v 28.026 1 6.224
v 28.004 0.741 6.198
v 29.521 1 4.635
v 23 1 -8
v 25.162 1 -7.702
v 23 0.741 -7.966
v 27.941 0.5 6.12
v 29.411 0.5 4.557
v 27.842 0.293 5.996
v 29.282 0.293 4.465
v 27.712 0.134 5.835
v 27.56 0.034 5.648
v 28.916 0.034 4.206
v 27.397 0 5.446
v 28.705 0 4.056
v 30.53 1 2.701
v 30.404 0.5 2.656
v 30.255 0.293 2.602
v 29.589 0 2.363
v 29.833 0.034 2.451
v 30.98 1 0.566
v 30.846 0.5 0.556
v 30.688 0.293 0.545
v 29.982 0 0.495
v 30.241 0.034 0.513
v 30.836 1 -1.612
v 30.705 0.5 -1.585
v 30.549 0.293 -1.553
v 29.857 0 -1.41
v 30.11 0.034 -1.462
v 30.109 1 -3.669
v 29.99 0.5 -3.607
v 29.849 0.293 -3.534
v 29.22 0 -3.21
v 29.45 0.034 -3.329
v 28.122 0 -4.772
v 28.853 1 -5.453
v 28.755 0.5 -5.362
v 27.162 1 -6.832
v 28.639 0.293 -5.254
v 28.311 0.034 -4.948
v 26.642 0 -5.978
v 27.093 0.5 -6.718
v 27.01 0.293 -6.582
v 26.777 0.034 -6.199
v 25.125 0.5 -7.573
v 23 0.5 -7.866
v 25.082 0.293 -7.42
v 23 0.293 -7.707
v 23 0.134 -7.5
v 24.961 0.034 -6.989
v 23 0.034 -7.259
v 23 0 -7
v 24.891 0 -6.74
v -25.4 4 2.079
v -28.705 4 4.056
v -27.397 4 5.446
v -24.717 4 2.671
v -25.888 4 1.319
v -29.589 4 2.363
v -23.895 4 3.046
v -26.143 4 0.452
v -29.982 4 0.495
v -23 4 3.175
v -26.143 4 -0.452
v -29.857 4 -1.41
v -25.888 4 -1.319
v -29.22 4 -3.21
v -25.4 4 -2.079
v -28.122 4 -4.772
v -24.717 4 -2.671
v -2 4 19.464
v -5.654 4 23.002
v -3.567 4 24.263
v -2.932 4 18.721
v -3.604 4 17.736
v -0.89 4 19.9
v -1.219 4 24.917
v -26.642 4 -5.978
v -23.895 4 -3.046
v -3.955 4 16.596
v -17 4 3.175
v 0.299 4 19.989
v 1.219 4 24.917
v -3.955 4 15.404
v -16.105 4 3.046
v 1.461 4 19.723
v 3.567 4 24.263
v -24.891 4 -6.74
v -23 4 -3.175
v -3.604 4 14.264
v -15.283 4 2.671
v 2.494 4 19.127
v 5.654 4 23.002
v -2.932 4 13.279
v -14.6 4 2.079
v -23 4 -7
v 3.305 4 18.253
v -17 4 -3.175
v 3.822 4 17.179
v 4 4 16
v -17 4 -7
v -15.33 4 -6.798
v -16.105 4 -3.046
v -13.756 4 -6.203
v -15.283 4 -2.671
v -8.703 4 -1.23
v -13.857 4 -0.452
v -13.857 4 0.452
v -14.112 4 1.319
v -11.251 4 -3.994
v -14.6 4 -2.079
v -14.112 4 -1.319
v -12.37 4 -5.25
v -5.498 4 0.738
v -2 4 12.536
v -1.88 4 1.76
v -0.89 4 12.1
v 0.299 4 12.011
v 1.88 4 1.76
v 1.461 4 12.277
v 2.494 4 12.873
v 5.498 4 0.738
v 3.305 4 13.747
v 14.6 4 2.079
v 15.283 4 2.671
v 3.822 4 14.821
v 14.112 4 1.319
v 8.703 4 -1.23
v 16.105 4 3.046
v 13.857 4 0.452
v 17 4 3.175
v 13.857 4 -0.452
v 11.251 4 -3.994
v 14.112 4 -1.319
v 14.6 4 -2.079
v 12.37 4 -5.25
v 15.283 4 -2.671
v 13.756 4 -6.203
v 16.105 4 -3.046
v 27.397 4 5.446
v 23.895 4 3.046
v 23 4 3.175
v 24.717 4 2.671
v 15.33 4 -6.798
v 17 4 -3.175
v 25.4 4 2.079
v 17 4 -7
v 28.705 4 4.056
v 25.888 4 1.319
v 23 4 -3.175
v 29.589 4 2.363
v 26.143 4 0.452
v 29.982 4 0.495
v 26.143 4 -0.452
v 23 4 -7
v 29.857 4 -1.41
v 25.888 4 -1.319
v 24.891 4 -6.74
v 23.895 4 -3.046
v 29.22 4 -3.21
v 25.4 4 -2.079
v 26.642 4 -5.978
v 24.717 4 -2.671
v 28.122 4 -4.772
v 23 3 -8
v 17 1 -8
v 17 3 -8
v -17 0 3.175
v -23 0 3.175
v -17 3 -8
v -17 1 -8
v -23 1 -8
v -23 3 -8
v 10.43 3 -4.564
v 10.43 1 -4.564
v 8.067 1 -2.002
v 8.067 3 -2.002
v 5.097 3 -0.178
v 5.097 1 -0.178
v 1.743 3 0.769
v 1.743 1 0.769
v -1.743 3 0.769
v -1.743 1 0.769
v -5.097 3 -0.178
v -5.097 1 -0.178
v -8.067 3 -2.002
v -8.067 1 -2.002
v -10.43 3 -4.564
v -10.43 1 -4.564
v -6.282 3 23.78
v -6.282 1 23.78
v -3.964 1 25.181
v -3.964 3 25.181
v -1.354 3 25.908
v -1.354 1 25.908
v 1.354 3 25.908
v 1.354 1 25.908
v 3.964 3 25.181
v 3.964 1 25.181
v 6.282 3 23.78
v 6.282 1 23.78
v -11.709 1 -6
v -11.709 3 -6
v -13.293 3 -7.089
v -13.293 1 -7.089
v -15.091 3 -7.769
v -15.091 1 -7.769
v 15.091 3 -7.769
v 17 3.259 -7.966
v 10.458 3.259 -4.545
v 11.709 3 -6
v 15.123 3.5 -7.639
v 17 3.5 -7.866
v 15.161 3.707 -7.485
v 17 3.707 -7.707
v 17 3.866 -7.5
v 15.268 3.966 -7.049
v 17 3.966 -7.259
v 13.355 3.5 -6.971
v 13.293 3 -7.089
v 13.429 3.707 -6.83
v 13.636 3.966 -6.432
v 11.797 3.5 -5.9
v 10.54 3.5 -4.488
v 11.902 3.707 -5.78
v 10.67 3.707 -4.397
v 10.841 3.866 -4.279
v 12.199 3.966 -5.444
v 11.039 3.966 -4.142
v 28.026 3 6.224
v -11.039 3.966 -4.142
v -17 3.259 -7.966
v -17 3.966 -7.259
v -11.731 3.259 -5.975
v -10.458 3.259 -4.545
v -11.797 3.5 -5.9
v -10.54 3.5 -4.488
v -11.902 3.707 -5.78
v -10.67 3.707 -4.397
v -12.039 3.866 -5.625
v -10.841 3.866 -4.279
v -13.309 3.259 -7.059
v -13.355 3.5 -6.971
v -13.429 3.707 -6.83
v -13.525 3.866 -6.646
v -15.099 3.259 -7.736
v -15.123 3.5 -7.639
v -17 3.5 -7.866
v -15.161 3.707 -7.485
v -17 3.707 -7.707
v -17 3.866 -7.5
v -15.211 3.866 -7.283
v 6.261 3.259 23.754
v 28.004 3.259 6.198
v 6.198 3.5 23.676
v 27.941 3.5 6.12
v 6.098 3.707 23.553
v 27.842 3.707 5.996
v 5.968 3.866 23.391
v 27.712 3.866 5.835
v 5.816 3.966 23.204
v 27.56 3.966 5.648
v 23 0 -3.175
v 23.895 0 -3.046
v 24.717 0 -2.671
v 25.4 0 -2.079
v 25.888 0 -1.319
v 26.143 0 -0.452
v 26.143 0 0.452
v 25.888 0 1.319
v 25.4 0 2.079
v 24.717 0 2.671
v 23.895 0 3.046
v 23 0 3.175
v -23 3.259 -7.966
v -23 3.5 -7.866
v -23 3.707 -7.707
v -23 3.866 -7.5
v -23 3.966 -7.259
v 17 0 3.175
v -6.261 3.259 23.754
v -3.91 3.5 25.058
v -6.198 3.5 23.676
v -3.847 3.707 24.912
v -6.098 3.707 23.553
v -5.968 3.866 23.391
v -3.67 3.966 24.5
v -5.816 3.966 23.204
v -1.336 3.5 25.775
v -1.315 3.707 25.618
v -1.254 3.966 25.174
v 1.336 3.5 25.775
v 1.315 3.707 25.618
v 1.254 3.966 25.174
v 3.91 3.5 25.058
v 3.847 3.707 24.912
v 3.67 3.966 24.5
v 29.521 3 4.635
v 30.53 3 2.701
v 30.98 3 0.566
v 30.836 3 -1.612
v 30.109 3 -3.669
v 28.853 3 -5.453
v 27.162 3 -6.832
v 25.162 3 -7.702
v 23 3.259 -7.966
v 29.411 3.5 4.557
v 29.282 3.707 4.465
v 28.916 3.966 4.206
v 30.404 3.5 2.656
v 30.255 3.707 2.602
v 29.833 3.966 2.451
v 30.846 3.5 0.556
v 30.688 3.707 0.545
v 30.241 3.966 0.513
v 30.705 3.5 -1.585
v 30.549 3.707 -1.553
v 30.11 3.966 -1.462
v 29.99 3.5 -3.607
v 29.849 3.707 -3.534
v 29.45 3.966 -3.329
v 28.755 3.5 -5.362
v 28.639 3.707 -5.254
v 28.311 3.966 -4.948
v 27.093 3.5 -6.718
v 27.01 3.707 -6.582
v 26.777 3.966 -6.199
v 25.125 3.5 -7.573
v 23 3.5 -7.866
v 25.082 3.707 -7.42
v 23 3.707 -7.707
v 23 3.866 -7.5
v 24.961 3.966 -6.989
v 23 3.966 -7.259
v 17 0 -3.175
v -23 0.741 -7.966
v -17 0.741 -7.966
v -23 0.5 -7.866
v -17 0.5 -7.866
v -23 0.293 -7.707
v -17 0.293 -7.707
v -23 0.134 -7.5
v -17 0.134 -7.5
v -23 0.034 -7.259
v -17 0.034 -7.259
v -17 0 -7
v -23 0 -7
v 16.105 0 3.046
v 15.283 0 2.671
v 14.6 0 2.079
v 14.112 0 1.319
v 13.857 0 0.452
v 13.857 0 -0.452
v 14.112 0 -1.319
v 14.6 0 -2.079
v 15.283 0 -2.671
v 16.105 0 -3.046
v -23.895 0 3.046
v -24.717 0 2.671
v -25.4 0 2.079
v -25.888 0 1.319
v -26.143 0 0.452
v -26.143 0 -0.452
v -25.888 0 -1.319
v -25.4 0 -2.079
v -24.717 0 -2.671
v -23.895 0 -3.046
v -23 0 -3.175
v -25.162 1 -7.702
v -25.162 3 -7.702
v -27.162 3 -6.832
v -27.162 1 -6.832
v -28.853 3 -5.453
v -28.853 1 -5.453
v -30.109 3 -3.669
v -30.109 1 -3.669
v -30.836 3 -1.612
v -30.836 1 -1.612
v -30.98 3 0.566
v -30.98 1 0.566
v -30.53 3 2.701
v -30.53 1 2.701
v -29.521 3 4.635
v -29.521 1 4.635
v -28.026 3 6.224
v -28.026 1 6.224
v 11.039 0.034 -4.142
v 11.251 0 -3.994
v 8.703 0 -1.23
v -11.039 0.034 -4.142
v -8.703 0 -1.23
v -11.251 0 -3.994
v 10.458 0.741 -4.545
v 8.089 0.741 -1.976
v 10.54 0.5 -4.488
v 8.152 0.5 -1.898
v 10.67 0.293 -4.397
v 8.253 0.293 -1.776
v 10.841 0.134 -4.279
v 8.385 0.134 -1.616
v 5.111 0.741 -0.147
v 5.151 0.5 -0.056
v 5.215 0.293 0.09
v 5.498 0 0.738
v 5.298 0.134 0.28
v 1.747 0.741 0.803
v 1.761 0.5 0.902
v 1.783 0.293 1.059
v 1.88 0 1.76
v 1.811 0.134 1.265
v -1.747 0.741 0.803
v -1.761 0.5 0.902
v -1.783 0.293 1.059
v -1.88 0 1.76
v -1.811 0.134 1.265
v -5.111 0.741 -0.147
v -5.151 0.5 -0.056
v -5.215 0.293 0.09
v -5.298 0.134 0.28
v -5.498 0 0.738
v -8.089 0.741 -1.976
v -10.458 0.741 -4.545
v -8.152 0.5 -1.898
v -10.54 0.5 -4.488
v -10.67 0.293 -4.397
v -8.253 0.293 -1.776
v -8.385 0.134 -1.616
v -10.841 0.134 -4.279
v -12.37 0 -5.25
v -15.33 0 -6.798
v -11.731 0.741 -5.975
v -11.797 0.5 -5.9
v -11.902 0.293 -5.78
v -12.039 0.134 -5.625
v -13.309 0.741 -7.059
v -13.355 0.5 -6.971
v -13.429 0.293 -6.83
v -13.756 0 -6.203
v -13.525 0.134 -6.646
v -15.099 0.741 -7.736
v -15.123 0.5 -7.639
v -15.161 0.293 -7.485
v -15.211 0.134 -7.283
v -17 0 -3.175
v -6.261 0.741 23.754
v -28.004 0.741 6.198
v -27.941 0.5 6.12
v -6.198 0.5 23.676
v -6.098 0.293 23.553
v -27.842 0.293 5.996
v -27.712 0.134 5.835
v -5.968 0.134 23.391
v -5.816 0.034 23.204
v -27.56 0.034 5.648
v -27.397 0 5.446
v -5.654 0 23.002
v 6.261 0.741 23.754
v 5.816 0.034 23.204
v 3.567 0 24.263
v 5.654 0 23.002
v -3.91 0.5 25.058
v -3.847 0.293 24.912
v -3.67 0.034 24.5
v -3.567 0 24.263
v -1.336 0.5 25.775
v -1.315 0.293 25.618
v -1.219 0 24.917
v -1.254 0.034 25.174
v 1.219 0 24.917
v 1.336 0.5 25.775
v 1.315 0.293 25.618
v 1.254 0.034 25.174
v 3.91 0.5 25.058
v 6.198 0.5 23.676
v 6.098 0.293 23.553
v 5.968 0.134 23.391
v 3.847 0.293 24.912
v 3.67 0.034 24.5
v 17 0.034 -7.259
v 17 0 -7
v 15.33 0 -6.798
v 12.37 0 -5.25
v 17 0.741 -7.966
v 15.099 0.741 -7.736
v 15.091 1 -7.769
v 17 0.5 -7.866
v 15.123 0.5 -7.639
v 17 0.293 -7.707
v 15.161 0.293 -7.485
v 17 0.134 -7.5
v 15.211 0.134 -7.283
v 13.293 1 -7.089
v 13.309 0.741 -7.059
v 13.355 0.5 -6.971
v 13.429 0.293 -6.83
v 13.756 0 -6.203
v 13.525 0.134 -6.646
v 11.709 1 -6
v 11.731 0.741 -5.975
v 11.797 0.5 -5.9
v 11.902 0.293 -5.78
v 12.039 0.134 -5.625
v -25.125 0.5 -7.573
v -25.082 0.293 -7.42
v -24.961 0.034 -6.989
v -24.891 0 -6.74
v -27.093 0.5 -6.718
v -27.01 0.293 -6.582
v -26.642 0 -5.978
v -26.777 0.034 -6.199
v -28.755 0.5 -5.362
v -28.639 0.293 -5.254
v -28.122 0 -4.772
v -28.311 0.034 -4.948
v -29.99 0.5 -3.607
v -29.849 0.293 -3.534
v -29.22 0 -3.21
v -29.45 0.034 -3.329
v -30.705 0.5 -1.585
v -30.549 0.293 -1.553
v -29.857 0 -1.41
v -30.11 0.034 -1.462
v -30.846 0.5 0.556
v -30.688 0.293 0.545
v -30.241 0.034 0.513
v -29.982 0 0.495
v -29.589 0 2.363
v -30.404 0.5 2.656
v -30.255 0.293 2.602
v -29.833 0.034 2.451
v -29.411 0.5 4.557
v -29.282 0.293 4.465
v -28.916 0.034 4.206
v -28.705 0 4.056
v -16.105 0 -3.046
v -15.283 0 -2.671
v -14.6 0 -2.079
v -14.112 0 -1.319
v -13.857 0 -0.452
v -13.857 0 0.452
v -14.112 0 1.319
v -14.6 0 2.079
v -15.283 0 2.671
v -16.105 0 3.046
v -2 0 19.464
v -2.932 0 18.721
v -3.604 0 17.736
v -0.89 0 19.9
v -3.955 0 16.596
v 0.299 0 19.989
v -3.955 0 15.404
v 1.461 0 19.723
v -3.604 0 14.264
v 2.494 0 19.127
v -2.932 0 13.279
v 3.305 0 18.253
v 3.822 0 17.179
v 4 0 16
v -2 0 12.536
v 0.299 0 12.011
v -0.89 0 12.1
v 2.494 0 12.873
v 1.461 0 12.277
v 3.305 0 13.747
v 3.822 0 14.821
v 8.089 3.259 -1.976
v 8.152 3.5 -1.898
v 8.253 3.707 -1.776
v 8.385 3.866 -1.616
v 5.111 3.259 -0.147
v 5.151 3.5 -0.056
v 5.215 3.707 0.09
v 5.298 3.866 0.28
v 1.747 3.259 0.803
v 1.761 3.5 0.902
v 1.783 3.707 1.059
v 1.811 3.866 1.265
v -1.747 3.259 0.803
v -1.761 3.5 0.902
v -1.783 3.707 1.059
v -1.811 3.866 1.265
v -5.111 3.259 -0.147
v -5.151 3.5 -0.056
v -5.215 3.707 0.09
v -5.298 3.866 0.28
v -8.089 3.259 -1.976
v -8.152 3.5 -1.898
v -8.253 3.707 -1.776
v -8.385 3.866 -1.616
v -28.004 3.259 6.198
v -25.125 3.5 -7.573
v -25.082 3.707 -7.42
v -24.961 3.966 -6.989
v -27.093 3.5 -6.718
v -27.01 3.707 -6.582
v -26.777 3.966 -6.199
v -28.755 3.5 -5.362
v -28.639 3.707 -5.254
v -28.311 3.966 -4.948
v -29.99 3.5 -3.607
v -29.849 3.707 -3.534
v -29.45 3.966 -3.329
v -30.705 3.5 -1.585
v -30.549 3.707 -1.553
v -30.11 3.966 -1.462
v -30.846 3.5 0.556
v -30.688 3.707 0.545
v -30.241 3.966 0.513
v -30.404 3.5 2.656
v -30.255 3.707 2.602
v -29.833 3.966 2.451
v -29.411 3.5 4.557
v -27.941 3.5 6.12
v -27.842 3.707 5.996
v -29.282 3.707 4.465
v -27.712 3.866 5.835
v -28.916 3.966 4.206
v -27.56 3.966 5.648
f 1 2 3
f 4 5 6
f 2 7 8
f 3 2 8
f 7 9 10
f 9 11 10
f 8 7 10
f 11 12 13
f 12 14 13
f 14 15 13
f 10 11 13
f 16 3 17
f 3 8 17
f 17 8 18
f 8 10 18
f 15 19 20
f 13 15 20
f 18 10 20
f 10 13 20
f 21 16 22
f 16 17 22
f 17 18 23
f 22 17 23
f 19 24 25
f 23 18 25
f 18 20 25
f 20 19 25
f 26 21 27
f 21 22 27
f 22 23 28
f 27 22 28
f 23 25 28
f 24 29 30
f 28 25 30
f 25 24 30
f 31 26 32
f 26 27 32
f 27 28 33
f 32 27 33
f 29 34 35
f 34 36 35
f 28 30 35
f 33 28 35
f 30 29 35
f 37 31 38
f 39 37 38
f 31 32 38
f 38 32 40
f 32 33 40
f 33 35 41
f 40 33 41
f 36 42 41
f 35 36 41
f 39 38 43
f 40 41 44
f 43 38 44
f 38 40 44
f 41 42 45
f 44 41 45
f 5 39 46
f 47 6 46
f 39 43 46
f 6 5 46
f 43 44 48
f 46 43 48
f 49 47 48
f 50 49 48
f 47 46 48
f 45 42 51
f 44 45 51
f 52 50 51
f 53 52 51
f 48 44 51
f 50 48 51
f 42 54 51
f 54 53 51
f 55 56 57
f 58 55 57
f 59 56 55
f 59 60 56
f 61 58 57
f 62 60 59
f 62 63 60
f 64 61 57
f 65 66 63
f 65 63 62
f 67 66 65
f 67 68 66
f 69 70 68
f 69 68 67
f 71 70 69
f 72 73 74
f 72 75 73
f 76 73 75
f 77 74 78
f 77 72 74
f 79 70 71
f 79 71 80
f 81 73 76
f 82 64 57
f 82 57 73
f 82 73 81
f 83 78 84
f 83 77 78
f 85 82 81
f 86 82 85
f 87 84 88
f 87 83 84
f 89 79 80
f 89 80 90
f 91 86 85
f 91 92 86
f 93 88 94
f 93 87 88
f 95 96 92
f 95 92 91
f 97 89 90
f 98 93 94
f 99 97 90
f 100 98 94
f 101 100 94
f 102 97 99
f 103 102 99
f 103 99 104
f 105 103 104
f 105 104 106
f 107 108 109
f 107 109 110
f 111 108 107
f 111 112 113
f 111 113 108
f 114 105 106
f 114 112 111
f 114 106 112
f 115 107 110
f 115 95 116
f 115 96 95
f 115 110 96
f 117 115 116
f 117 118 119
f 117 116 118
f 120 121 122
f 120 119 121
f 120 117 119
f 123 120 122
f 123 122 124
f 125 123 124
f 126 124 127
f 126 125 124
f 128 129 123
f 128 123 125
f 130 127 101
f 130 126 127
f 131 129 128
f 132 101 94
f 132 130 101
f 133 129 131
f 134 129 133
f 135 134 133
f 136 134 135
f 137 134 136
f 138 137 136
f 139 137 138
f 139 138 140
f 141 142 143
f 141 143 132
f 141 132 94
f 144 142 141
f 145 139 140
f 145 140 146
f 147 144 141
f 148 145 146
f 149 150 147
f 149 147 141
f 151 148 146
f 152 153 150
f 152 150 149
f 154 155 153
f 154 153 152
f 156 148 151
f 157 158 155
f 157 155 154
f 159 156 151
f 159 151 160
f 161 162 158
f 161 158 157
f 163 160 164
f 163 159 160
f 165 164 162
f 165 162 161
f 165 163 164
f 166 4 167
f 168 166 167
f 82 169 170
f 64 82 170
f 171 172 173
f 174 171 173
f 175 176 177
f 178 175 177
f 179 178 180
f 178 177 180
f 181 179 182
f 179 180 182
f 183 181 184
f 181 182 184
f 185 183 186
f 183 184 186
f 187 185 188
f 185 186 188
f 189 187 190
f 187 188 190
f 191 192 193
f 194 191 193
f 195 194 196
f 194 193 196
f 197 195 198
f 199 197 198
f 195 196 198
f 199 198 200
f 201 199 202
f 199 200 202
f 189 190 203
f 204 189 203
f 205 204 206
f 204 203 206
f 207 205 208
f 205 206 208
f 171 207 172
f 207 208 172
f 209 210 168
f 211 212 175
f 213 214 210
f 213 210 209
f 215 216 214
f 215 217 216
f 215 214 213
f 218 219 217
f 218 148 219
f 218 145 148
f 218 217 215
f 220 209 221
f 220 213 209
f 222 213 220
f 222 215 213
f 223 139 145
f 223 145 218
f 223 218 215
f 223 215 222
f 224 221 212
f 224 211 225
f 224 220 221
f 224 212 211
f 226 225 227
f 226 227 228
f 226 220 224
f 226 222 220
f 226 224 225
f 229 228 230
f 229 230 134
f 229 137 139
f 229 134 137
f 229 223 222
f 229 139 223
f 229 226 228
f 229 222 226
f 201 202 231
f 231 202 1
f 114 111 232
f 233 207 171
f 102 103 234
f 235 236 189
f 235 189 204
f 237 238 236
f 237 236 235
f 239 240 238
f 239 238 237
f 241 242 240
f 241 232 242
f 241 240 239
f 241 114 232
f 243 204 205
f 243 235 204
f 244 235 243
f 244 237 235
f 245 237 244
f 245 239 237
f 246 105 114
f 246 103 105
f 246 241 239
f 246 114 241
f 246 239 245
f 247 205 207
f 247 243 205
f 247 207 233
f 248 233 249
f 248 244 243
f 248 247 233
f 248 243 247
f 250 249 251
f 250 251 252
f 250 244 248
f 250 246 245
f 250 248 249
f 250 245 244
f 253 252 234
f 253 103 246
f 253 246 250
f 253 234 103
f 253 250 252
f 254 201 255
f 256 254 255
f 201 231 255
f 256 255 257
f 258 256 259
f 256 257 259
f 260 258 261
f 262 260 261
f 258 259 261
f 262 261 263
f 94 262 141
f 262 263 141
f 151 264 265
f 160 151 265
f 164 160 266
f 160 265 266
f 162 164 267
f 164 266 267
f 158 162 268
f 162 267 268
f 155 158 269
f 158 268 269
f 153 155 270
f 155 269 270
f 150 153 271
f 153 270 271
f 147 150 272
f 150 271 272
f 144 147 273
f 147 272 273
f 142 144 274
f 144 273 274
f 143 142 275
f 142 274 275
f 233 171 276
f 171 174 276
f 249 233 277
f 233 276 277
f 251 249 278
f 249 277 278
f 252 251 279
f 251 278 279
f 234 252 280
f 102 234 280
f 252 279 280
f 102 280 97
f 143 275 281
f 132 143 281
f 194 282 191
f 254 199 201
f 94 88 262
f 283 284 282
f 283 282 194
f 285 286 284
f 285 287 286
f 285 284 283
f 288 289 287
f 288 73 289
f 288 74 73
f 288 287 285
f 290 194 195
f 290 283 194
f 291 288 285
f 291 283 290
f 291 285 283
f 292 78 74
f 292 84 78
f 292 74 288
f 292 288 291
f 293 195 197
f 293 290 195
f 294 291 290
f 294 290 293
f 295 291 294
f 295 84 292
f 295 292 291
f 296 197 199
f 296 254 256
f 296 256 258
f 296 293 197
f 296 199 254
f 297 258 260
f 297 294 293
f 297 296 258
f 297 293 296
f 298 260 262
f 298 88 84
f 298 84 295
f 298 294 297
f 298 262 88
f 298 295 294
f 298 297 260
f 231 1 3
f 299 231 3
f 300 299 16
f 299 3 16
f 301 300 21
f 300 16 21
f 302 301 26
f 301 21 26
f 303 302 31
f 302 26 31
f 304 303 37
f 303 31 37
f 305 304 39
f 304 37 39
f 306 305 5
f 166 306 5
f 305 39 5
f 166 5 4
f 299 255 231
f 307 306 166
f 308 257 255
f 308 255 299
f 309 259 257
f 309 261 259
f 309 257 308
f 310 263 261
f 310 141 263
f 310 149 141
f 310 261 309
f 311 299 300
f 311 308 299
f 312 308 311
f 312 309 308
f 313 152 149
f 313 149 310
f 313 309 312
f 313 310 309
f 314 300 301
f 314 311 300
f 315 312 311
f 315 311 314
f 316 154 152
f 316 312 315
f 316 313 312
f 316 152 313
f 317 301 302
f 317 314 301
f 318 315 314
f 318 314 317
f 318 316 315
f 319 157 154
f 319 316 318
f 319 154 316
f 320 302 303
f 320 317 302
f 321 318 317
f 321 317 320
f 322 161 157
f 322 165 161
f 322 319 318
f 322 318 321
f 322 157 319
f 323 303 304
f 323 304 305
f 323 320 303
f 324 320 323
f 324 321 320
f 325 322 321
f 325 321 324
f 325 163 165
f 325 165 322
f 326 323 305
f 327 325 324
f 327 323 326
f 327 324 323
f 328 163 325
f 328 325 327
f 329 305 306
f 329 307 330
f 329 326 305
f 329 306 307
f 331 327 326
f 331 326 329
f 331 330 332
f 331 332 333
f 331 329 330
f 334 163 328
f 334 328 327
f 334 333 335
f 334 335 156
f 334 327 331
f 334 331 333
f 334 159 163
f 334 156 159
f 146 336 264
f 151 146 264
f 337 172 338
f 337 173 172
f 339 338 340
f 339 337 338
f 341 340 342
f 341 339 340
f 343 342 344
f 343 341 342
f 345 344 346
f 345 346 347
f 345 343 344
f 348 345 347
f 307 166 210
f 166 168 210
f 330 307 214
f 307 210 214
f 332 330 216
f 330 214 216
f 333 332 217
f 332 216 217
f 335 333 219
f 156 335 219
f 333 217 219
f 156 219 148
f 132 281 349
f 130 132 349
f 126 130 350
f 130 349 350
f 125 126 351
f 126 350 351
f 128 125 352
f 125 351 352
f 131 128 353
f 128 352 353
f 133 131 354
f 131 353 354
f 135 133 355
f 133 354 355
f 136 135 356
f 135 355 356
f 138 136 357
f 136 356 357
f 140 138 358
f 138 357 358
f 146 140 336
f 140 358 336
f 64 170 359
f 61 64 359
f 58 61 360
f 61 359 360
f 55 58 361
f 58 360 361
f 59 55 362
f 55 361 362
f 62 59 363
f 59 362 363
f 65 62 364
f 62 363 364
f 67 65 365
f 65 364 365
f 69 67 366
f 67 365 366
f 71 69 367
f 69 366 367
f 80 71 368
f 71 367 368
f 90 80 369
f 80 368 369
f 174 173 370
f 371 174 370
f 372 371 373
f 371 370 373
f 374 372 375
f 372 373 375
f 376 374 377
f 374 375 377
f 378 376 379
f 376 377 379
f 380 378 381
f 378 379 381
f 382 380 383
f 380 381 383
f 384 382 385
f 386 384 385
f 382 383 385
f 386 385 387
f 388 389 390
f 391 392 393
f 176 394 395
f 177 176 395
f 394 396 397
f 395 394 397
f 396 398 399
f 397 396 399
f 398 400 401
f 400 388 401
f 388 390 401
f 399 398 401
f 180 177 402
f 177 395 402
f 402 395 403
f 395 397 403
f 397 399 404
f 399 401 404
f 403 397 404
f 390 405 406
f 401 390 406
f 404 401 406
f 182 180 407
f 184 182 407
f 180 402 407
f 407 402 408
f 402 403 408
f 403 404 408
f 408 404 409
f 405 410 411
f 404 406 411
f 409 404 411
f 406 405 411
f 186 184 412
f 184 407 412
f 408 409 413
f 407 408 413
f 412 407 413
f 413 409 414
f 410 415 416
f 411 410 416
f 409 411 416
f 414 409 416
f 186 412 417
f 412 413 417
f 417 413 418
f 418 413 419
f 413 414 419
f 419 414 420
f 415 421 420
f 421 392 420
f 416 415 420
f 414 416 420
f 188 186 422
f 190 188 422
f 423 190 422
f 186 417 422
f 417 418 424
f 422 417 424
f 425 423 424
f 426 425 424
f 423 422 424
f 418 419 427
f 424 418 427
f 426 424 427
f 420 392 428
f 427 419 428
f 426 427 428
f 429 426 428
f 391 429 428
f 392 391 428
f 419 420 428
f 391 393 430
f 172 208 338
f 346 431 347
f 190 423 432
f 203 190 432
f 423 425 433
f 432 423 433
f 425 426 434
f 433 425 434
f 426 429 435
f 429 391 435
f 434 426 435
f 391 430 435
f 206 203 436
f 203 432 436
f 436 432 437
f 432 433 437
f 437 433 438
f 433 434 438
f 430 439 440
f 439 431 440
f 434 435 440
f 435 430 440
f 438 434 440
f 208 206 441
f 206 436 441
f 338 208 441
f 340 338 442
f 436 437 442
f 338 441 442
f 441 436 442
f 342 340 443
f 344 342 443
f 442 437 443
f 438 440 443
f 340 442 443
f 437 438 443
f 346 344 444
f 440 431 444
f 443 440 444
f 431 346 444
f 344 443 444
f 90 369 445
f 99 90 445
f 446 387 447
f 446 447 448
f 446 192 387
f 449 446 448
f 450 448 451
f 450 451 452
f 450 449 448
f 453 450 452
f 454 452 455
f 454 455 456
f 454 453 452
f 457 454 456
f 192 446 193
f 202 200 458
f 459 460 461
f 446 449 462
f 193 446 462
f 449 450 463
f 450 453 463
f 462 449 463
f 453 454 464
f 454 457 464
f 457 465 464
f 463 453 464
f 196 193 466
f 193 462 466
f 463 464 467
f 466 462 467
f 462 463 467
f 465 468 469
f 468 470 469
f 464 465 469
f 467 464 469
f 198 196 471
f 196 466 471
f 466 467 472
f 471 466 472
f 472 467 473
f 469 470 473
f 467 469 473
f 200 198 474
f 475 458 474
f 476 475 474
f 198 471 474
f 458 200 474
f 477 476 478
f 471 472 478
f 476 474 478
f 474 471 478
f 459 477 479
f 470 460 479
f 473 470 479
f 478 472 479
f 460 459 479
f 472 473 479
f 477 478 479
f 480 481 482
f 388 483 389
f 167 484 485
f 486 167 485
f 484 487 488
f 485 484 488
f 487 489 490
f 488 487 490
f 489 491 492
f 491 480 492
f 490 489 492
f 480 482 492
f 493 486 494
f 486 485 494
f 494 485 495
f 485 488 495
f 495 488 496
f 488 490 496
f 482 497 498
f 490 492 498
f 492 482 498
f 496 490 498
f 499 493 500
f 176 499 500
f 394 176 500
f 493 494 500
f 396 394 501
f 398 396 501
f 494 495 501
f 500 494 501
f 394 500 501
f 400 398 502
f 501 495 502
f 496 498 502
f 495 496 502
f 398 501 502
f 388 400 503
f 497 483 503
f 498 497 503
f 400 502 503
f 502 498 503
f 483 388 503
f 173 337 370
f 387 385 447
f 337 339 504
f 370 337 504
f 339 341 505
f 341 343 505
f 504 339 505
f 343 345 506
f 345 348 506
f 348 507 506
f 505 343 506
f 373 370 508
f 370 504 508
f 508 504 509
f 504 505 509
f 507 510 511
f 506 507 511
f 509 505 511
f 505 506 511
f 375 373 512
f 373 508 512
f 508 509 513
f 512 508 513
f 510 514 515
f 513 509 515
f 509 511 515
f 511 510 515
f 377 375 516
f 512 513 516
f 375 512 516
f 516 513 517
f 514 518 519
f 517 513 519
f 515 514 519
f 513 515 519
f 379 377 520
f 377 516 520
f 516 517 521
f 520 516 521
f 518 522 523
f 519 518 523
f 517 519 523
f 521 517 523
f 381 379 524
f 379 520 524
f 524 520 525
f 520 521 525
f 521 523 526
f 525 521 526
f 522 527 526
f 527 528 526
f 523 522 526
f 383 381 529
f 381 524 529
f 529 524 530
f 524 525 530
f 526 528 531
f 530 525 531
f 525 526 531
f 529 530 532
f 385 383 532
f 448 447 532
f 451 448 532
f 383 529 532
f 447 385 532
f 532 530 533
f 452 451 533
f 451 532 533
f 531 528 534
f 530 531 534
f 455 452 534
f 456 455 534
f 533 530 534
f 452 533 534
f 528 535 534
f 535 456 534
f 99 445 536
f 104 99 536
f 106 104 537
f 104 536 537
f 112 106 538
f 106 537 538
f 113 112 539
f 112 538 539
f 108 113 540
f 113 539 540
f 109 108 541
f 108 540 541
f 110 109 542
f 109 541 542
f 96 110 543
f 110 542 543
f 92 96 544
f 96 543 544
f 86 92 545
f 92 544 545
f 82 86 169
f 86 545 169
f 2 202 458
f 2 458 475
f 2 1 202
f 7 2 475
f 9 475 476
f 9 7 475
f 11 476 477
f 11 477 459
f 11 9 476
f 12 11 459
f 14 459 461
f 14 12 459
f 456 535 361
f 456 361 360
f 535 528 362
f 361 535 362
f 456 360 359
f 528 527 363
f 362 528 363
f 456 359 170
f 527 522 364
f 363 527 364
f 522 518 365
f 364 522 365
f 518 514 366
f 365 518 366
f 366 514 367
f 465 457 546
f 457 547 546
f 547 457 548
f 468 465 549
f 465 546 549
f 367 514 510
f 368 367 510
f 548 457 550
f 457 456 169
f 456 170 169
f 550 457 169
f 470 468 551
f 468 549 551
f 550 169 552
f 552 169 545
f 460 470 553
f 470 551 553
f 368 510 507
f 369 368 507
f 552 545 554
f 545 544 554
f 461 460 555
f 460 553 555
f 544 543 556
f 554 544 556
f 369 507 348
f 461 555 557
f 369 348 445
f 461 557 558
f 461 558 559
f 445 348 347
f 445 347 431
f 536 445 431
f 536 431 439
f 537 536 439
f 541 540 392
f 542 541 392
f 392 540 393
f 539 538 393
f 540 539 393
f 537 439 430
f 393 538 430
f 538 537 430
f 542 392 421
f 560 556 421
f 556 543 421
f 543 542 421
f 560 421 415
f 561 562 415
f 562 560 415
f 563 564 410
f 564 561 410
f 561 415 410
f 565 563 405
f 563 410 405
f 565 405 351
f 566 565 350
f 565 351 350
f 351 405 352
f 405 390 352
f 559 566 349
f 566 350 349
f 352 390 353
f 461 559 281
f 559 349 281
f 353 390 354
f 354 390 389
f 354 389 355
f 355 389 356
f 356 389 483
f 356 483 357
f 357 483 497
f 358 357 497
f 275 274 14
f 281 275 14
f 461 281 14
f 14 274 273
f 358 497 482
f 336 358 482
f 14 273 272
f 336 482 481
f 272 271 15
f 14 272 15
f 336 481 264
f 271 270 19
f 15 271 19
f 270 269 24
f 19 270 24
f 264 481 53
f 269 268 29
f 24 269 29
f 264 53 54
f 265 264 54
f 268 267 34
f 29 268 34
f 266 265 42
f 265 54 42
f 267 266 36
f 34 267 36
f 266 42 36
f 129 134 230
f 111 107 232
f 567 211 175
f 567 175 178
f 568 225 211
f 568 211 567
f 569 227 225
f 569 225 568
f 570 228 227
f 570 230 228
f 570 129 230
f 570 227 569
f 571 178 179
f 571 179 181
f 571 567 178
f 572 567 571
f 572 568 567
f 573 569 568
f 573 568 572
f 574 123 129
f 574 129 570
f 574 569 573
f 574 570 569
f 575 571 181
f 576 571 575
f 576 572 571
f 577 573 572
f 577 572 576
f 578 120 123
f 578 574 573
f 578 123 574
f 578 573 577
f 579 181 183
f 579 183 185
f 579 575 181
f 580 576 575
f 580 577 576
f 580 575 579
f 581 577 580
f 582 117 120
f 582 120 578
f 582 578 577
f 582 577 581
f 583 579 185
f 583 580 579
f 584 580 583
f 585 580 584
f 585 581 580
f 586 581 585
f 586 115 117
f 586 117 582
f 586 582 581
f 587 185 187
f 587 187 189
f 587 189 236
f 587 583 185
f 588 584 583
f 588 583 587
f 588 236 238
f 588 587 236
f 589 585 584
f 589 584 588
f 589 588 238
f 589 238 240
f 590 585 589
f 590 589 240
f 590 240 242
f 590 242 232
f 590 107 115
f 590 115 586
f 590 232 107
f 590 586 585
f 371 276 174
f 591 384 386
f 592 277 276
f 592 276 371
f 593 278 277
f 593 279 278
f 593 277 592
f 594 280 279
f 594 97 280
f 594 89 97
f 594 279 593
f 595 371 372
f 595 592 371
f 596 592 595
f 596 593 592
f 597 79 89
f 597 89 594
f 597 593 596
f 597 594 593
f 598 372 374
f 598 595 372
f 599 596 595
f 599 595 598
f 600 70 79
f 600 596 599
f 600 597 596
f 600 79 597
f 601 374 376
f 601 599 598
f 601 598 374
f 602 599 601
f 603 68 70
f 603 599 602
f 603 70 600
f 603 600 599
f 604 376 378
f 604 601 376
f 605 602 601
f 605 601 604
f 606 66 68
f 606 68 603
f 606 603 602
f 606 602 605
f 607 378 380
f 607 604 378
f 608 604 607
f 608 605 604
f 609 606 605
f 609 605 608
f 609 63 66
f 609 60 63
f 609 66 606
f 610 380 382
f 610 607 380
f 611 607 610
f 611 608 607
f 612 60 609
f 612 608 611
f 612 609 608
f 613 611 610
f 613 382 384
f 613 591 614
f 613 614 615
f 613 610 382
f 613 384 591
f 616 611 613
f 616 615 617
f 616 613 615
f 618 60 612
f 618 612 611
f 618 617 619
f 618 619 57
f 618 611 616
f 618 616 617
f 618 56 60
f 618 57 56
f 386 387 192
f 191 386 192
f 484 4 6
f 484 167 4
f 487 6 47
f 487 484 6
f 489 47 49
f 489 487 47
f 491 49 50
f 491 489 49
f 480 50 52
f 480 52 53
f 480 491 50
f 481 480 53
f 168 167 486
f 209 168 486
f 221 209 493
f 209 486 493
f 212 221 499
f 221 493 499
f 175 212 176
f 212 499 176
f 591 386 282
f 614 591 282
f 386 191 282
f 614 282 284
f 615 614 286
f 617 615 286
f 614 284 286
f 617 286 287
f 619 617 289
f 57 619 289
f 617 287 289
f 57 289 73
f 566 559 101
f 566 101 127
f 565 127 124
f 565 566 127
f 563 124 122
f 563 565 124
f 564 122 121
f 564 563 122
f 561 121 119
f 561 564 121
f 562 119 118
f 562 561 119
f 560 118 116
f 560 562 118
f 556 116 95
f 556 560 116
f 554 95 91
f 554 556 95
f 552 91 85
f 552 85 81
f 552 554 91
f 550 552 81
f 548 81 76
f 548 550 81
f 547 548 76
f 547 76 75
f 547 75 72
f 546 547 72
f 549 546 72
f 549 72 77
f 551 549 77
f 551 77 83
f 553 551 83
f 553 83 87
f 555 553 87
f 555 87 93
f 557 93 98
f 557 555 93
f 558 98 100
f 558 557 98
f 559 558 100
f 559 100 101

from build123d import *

# Parameters (mm, degrees)
SKETCH1_R           = 4
BOSS_EXTRUDE1_DEPTH = 4
FILLET1_R           = 1


with BuildPart() as part:
    # Sketch1 → Boss-Extrude1 (new body)
    with BuildSketch(Plane(origin=(0, 0, 0), x_dir=(1, 0, 0), z_dir=(0, 1, 0))):
        with BuildLine():
            Line((-28.025651318, -6.22437377), (-6.282064148, -23.780467212))
            ThreePointArc((-6.282064148, -23.780467212), (0, -26), (6.282064148, -23.780467212))
            Line((6.282064148, -23.780467212), (28.025651318, -6.22437377))
            ThreePointArc((28.025651318, -6.22437377), (30.543042826, 2.665052517), (23, 8))
            Line((23, 8), (17, 8))
            ThreePointArc((17, 8), (13.292968107, 7.089281666), (10.429951691, 4.564478636))
            ThreePointArc((10.429951691, 4.564478636), (0, -0.88941153), (-10.429951691, 4.564478636))
            ThreePointArc((-10.429951691, 4.564478636), (-13.292968107, 7.089281666), (-17, 8))
            Line((-17, 8), (-23, 8))
            ThreePointArc((-23, 8), (-30.543042826, 2.665052517), (-28.025651318, -6.22437377))
        make_face()
        with Locations((0, -16)):
            Circle(SKETCH1_R, mode=Mode.SUBTRACT)
        with BuildLine():
            Line((-23, 3.175), (-17, 3.175))
            ThreePointArc((-17, 3.175), (-13.825, 0), (-17, -3.175))
            Line((-17, -3.175), (-23, -3.175))
            ThreePointArc((-23, -3.175), (-26.175, 0), (-23, 3.175))
        make_face(mode=Mode.SUBTRACT)
        with BuildLine():
            Line((17, 3.175), (23, 3.175))
            ThreePointArc((23, 3.175), (26.175, 0), (23, -3.175))
            Line((23, -3.175), (17, -3.175))
            ThreePointArc((17, -3.175), (13.825, 0), (17, 3.175))
        make_face(mode=Mode.SUBTRACT)
    extrude(amount=BOSS_EXTRUDE1_DEPTH)

    # Fillet1
    fillet1_edges = [part.edges().sort_by_distance(p)[0] for p in [
        (0, 4, 26),
        (0, 0, 0.88941153),
        (13.292968107, 0, -7.089281666),
        (20, 0, -8),
        (30.543042826, 0, -2.665052517),
        (17.153857733, 0, 15.002420491),
        (0, 0, 26),
        (-17.153857733, 0, 15.002420491),
        (-30.543042826, 0, -2.665052517),
        (17.153857733, 4, 15.002420491),
        (30.543042826, 4, -2.665052517),
        (20, 4, -8),
        (13.292968107, 4, -7.089281666),
        (0, 4, 0.88941153),
        (-13.292968107, 4, -7.089281666),
        (-20, 4, -8),
        (-30.543042826, 4, -2.665052517),
        (-17.153857733, 4, 15.002420491),
        (-20, 0, -8),
        (-13.292968107, 0, -7.089281666),
    ]]
    fillet(fillet1_edges, radius=FILLET1_R)


solid = part.part
